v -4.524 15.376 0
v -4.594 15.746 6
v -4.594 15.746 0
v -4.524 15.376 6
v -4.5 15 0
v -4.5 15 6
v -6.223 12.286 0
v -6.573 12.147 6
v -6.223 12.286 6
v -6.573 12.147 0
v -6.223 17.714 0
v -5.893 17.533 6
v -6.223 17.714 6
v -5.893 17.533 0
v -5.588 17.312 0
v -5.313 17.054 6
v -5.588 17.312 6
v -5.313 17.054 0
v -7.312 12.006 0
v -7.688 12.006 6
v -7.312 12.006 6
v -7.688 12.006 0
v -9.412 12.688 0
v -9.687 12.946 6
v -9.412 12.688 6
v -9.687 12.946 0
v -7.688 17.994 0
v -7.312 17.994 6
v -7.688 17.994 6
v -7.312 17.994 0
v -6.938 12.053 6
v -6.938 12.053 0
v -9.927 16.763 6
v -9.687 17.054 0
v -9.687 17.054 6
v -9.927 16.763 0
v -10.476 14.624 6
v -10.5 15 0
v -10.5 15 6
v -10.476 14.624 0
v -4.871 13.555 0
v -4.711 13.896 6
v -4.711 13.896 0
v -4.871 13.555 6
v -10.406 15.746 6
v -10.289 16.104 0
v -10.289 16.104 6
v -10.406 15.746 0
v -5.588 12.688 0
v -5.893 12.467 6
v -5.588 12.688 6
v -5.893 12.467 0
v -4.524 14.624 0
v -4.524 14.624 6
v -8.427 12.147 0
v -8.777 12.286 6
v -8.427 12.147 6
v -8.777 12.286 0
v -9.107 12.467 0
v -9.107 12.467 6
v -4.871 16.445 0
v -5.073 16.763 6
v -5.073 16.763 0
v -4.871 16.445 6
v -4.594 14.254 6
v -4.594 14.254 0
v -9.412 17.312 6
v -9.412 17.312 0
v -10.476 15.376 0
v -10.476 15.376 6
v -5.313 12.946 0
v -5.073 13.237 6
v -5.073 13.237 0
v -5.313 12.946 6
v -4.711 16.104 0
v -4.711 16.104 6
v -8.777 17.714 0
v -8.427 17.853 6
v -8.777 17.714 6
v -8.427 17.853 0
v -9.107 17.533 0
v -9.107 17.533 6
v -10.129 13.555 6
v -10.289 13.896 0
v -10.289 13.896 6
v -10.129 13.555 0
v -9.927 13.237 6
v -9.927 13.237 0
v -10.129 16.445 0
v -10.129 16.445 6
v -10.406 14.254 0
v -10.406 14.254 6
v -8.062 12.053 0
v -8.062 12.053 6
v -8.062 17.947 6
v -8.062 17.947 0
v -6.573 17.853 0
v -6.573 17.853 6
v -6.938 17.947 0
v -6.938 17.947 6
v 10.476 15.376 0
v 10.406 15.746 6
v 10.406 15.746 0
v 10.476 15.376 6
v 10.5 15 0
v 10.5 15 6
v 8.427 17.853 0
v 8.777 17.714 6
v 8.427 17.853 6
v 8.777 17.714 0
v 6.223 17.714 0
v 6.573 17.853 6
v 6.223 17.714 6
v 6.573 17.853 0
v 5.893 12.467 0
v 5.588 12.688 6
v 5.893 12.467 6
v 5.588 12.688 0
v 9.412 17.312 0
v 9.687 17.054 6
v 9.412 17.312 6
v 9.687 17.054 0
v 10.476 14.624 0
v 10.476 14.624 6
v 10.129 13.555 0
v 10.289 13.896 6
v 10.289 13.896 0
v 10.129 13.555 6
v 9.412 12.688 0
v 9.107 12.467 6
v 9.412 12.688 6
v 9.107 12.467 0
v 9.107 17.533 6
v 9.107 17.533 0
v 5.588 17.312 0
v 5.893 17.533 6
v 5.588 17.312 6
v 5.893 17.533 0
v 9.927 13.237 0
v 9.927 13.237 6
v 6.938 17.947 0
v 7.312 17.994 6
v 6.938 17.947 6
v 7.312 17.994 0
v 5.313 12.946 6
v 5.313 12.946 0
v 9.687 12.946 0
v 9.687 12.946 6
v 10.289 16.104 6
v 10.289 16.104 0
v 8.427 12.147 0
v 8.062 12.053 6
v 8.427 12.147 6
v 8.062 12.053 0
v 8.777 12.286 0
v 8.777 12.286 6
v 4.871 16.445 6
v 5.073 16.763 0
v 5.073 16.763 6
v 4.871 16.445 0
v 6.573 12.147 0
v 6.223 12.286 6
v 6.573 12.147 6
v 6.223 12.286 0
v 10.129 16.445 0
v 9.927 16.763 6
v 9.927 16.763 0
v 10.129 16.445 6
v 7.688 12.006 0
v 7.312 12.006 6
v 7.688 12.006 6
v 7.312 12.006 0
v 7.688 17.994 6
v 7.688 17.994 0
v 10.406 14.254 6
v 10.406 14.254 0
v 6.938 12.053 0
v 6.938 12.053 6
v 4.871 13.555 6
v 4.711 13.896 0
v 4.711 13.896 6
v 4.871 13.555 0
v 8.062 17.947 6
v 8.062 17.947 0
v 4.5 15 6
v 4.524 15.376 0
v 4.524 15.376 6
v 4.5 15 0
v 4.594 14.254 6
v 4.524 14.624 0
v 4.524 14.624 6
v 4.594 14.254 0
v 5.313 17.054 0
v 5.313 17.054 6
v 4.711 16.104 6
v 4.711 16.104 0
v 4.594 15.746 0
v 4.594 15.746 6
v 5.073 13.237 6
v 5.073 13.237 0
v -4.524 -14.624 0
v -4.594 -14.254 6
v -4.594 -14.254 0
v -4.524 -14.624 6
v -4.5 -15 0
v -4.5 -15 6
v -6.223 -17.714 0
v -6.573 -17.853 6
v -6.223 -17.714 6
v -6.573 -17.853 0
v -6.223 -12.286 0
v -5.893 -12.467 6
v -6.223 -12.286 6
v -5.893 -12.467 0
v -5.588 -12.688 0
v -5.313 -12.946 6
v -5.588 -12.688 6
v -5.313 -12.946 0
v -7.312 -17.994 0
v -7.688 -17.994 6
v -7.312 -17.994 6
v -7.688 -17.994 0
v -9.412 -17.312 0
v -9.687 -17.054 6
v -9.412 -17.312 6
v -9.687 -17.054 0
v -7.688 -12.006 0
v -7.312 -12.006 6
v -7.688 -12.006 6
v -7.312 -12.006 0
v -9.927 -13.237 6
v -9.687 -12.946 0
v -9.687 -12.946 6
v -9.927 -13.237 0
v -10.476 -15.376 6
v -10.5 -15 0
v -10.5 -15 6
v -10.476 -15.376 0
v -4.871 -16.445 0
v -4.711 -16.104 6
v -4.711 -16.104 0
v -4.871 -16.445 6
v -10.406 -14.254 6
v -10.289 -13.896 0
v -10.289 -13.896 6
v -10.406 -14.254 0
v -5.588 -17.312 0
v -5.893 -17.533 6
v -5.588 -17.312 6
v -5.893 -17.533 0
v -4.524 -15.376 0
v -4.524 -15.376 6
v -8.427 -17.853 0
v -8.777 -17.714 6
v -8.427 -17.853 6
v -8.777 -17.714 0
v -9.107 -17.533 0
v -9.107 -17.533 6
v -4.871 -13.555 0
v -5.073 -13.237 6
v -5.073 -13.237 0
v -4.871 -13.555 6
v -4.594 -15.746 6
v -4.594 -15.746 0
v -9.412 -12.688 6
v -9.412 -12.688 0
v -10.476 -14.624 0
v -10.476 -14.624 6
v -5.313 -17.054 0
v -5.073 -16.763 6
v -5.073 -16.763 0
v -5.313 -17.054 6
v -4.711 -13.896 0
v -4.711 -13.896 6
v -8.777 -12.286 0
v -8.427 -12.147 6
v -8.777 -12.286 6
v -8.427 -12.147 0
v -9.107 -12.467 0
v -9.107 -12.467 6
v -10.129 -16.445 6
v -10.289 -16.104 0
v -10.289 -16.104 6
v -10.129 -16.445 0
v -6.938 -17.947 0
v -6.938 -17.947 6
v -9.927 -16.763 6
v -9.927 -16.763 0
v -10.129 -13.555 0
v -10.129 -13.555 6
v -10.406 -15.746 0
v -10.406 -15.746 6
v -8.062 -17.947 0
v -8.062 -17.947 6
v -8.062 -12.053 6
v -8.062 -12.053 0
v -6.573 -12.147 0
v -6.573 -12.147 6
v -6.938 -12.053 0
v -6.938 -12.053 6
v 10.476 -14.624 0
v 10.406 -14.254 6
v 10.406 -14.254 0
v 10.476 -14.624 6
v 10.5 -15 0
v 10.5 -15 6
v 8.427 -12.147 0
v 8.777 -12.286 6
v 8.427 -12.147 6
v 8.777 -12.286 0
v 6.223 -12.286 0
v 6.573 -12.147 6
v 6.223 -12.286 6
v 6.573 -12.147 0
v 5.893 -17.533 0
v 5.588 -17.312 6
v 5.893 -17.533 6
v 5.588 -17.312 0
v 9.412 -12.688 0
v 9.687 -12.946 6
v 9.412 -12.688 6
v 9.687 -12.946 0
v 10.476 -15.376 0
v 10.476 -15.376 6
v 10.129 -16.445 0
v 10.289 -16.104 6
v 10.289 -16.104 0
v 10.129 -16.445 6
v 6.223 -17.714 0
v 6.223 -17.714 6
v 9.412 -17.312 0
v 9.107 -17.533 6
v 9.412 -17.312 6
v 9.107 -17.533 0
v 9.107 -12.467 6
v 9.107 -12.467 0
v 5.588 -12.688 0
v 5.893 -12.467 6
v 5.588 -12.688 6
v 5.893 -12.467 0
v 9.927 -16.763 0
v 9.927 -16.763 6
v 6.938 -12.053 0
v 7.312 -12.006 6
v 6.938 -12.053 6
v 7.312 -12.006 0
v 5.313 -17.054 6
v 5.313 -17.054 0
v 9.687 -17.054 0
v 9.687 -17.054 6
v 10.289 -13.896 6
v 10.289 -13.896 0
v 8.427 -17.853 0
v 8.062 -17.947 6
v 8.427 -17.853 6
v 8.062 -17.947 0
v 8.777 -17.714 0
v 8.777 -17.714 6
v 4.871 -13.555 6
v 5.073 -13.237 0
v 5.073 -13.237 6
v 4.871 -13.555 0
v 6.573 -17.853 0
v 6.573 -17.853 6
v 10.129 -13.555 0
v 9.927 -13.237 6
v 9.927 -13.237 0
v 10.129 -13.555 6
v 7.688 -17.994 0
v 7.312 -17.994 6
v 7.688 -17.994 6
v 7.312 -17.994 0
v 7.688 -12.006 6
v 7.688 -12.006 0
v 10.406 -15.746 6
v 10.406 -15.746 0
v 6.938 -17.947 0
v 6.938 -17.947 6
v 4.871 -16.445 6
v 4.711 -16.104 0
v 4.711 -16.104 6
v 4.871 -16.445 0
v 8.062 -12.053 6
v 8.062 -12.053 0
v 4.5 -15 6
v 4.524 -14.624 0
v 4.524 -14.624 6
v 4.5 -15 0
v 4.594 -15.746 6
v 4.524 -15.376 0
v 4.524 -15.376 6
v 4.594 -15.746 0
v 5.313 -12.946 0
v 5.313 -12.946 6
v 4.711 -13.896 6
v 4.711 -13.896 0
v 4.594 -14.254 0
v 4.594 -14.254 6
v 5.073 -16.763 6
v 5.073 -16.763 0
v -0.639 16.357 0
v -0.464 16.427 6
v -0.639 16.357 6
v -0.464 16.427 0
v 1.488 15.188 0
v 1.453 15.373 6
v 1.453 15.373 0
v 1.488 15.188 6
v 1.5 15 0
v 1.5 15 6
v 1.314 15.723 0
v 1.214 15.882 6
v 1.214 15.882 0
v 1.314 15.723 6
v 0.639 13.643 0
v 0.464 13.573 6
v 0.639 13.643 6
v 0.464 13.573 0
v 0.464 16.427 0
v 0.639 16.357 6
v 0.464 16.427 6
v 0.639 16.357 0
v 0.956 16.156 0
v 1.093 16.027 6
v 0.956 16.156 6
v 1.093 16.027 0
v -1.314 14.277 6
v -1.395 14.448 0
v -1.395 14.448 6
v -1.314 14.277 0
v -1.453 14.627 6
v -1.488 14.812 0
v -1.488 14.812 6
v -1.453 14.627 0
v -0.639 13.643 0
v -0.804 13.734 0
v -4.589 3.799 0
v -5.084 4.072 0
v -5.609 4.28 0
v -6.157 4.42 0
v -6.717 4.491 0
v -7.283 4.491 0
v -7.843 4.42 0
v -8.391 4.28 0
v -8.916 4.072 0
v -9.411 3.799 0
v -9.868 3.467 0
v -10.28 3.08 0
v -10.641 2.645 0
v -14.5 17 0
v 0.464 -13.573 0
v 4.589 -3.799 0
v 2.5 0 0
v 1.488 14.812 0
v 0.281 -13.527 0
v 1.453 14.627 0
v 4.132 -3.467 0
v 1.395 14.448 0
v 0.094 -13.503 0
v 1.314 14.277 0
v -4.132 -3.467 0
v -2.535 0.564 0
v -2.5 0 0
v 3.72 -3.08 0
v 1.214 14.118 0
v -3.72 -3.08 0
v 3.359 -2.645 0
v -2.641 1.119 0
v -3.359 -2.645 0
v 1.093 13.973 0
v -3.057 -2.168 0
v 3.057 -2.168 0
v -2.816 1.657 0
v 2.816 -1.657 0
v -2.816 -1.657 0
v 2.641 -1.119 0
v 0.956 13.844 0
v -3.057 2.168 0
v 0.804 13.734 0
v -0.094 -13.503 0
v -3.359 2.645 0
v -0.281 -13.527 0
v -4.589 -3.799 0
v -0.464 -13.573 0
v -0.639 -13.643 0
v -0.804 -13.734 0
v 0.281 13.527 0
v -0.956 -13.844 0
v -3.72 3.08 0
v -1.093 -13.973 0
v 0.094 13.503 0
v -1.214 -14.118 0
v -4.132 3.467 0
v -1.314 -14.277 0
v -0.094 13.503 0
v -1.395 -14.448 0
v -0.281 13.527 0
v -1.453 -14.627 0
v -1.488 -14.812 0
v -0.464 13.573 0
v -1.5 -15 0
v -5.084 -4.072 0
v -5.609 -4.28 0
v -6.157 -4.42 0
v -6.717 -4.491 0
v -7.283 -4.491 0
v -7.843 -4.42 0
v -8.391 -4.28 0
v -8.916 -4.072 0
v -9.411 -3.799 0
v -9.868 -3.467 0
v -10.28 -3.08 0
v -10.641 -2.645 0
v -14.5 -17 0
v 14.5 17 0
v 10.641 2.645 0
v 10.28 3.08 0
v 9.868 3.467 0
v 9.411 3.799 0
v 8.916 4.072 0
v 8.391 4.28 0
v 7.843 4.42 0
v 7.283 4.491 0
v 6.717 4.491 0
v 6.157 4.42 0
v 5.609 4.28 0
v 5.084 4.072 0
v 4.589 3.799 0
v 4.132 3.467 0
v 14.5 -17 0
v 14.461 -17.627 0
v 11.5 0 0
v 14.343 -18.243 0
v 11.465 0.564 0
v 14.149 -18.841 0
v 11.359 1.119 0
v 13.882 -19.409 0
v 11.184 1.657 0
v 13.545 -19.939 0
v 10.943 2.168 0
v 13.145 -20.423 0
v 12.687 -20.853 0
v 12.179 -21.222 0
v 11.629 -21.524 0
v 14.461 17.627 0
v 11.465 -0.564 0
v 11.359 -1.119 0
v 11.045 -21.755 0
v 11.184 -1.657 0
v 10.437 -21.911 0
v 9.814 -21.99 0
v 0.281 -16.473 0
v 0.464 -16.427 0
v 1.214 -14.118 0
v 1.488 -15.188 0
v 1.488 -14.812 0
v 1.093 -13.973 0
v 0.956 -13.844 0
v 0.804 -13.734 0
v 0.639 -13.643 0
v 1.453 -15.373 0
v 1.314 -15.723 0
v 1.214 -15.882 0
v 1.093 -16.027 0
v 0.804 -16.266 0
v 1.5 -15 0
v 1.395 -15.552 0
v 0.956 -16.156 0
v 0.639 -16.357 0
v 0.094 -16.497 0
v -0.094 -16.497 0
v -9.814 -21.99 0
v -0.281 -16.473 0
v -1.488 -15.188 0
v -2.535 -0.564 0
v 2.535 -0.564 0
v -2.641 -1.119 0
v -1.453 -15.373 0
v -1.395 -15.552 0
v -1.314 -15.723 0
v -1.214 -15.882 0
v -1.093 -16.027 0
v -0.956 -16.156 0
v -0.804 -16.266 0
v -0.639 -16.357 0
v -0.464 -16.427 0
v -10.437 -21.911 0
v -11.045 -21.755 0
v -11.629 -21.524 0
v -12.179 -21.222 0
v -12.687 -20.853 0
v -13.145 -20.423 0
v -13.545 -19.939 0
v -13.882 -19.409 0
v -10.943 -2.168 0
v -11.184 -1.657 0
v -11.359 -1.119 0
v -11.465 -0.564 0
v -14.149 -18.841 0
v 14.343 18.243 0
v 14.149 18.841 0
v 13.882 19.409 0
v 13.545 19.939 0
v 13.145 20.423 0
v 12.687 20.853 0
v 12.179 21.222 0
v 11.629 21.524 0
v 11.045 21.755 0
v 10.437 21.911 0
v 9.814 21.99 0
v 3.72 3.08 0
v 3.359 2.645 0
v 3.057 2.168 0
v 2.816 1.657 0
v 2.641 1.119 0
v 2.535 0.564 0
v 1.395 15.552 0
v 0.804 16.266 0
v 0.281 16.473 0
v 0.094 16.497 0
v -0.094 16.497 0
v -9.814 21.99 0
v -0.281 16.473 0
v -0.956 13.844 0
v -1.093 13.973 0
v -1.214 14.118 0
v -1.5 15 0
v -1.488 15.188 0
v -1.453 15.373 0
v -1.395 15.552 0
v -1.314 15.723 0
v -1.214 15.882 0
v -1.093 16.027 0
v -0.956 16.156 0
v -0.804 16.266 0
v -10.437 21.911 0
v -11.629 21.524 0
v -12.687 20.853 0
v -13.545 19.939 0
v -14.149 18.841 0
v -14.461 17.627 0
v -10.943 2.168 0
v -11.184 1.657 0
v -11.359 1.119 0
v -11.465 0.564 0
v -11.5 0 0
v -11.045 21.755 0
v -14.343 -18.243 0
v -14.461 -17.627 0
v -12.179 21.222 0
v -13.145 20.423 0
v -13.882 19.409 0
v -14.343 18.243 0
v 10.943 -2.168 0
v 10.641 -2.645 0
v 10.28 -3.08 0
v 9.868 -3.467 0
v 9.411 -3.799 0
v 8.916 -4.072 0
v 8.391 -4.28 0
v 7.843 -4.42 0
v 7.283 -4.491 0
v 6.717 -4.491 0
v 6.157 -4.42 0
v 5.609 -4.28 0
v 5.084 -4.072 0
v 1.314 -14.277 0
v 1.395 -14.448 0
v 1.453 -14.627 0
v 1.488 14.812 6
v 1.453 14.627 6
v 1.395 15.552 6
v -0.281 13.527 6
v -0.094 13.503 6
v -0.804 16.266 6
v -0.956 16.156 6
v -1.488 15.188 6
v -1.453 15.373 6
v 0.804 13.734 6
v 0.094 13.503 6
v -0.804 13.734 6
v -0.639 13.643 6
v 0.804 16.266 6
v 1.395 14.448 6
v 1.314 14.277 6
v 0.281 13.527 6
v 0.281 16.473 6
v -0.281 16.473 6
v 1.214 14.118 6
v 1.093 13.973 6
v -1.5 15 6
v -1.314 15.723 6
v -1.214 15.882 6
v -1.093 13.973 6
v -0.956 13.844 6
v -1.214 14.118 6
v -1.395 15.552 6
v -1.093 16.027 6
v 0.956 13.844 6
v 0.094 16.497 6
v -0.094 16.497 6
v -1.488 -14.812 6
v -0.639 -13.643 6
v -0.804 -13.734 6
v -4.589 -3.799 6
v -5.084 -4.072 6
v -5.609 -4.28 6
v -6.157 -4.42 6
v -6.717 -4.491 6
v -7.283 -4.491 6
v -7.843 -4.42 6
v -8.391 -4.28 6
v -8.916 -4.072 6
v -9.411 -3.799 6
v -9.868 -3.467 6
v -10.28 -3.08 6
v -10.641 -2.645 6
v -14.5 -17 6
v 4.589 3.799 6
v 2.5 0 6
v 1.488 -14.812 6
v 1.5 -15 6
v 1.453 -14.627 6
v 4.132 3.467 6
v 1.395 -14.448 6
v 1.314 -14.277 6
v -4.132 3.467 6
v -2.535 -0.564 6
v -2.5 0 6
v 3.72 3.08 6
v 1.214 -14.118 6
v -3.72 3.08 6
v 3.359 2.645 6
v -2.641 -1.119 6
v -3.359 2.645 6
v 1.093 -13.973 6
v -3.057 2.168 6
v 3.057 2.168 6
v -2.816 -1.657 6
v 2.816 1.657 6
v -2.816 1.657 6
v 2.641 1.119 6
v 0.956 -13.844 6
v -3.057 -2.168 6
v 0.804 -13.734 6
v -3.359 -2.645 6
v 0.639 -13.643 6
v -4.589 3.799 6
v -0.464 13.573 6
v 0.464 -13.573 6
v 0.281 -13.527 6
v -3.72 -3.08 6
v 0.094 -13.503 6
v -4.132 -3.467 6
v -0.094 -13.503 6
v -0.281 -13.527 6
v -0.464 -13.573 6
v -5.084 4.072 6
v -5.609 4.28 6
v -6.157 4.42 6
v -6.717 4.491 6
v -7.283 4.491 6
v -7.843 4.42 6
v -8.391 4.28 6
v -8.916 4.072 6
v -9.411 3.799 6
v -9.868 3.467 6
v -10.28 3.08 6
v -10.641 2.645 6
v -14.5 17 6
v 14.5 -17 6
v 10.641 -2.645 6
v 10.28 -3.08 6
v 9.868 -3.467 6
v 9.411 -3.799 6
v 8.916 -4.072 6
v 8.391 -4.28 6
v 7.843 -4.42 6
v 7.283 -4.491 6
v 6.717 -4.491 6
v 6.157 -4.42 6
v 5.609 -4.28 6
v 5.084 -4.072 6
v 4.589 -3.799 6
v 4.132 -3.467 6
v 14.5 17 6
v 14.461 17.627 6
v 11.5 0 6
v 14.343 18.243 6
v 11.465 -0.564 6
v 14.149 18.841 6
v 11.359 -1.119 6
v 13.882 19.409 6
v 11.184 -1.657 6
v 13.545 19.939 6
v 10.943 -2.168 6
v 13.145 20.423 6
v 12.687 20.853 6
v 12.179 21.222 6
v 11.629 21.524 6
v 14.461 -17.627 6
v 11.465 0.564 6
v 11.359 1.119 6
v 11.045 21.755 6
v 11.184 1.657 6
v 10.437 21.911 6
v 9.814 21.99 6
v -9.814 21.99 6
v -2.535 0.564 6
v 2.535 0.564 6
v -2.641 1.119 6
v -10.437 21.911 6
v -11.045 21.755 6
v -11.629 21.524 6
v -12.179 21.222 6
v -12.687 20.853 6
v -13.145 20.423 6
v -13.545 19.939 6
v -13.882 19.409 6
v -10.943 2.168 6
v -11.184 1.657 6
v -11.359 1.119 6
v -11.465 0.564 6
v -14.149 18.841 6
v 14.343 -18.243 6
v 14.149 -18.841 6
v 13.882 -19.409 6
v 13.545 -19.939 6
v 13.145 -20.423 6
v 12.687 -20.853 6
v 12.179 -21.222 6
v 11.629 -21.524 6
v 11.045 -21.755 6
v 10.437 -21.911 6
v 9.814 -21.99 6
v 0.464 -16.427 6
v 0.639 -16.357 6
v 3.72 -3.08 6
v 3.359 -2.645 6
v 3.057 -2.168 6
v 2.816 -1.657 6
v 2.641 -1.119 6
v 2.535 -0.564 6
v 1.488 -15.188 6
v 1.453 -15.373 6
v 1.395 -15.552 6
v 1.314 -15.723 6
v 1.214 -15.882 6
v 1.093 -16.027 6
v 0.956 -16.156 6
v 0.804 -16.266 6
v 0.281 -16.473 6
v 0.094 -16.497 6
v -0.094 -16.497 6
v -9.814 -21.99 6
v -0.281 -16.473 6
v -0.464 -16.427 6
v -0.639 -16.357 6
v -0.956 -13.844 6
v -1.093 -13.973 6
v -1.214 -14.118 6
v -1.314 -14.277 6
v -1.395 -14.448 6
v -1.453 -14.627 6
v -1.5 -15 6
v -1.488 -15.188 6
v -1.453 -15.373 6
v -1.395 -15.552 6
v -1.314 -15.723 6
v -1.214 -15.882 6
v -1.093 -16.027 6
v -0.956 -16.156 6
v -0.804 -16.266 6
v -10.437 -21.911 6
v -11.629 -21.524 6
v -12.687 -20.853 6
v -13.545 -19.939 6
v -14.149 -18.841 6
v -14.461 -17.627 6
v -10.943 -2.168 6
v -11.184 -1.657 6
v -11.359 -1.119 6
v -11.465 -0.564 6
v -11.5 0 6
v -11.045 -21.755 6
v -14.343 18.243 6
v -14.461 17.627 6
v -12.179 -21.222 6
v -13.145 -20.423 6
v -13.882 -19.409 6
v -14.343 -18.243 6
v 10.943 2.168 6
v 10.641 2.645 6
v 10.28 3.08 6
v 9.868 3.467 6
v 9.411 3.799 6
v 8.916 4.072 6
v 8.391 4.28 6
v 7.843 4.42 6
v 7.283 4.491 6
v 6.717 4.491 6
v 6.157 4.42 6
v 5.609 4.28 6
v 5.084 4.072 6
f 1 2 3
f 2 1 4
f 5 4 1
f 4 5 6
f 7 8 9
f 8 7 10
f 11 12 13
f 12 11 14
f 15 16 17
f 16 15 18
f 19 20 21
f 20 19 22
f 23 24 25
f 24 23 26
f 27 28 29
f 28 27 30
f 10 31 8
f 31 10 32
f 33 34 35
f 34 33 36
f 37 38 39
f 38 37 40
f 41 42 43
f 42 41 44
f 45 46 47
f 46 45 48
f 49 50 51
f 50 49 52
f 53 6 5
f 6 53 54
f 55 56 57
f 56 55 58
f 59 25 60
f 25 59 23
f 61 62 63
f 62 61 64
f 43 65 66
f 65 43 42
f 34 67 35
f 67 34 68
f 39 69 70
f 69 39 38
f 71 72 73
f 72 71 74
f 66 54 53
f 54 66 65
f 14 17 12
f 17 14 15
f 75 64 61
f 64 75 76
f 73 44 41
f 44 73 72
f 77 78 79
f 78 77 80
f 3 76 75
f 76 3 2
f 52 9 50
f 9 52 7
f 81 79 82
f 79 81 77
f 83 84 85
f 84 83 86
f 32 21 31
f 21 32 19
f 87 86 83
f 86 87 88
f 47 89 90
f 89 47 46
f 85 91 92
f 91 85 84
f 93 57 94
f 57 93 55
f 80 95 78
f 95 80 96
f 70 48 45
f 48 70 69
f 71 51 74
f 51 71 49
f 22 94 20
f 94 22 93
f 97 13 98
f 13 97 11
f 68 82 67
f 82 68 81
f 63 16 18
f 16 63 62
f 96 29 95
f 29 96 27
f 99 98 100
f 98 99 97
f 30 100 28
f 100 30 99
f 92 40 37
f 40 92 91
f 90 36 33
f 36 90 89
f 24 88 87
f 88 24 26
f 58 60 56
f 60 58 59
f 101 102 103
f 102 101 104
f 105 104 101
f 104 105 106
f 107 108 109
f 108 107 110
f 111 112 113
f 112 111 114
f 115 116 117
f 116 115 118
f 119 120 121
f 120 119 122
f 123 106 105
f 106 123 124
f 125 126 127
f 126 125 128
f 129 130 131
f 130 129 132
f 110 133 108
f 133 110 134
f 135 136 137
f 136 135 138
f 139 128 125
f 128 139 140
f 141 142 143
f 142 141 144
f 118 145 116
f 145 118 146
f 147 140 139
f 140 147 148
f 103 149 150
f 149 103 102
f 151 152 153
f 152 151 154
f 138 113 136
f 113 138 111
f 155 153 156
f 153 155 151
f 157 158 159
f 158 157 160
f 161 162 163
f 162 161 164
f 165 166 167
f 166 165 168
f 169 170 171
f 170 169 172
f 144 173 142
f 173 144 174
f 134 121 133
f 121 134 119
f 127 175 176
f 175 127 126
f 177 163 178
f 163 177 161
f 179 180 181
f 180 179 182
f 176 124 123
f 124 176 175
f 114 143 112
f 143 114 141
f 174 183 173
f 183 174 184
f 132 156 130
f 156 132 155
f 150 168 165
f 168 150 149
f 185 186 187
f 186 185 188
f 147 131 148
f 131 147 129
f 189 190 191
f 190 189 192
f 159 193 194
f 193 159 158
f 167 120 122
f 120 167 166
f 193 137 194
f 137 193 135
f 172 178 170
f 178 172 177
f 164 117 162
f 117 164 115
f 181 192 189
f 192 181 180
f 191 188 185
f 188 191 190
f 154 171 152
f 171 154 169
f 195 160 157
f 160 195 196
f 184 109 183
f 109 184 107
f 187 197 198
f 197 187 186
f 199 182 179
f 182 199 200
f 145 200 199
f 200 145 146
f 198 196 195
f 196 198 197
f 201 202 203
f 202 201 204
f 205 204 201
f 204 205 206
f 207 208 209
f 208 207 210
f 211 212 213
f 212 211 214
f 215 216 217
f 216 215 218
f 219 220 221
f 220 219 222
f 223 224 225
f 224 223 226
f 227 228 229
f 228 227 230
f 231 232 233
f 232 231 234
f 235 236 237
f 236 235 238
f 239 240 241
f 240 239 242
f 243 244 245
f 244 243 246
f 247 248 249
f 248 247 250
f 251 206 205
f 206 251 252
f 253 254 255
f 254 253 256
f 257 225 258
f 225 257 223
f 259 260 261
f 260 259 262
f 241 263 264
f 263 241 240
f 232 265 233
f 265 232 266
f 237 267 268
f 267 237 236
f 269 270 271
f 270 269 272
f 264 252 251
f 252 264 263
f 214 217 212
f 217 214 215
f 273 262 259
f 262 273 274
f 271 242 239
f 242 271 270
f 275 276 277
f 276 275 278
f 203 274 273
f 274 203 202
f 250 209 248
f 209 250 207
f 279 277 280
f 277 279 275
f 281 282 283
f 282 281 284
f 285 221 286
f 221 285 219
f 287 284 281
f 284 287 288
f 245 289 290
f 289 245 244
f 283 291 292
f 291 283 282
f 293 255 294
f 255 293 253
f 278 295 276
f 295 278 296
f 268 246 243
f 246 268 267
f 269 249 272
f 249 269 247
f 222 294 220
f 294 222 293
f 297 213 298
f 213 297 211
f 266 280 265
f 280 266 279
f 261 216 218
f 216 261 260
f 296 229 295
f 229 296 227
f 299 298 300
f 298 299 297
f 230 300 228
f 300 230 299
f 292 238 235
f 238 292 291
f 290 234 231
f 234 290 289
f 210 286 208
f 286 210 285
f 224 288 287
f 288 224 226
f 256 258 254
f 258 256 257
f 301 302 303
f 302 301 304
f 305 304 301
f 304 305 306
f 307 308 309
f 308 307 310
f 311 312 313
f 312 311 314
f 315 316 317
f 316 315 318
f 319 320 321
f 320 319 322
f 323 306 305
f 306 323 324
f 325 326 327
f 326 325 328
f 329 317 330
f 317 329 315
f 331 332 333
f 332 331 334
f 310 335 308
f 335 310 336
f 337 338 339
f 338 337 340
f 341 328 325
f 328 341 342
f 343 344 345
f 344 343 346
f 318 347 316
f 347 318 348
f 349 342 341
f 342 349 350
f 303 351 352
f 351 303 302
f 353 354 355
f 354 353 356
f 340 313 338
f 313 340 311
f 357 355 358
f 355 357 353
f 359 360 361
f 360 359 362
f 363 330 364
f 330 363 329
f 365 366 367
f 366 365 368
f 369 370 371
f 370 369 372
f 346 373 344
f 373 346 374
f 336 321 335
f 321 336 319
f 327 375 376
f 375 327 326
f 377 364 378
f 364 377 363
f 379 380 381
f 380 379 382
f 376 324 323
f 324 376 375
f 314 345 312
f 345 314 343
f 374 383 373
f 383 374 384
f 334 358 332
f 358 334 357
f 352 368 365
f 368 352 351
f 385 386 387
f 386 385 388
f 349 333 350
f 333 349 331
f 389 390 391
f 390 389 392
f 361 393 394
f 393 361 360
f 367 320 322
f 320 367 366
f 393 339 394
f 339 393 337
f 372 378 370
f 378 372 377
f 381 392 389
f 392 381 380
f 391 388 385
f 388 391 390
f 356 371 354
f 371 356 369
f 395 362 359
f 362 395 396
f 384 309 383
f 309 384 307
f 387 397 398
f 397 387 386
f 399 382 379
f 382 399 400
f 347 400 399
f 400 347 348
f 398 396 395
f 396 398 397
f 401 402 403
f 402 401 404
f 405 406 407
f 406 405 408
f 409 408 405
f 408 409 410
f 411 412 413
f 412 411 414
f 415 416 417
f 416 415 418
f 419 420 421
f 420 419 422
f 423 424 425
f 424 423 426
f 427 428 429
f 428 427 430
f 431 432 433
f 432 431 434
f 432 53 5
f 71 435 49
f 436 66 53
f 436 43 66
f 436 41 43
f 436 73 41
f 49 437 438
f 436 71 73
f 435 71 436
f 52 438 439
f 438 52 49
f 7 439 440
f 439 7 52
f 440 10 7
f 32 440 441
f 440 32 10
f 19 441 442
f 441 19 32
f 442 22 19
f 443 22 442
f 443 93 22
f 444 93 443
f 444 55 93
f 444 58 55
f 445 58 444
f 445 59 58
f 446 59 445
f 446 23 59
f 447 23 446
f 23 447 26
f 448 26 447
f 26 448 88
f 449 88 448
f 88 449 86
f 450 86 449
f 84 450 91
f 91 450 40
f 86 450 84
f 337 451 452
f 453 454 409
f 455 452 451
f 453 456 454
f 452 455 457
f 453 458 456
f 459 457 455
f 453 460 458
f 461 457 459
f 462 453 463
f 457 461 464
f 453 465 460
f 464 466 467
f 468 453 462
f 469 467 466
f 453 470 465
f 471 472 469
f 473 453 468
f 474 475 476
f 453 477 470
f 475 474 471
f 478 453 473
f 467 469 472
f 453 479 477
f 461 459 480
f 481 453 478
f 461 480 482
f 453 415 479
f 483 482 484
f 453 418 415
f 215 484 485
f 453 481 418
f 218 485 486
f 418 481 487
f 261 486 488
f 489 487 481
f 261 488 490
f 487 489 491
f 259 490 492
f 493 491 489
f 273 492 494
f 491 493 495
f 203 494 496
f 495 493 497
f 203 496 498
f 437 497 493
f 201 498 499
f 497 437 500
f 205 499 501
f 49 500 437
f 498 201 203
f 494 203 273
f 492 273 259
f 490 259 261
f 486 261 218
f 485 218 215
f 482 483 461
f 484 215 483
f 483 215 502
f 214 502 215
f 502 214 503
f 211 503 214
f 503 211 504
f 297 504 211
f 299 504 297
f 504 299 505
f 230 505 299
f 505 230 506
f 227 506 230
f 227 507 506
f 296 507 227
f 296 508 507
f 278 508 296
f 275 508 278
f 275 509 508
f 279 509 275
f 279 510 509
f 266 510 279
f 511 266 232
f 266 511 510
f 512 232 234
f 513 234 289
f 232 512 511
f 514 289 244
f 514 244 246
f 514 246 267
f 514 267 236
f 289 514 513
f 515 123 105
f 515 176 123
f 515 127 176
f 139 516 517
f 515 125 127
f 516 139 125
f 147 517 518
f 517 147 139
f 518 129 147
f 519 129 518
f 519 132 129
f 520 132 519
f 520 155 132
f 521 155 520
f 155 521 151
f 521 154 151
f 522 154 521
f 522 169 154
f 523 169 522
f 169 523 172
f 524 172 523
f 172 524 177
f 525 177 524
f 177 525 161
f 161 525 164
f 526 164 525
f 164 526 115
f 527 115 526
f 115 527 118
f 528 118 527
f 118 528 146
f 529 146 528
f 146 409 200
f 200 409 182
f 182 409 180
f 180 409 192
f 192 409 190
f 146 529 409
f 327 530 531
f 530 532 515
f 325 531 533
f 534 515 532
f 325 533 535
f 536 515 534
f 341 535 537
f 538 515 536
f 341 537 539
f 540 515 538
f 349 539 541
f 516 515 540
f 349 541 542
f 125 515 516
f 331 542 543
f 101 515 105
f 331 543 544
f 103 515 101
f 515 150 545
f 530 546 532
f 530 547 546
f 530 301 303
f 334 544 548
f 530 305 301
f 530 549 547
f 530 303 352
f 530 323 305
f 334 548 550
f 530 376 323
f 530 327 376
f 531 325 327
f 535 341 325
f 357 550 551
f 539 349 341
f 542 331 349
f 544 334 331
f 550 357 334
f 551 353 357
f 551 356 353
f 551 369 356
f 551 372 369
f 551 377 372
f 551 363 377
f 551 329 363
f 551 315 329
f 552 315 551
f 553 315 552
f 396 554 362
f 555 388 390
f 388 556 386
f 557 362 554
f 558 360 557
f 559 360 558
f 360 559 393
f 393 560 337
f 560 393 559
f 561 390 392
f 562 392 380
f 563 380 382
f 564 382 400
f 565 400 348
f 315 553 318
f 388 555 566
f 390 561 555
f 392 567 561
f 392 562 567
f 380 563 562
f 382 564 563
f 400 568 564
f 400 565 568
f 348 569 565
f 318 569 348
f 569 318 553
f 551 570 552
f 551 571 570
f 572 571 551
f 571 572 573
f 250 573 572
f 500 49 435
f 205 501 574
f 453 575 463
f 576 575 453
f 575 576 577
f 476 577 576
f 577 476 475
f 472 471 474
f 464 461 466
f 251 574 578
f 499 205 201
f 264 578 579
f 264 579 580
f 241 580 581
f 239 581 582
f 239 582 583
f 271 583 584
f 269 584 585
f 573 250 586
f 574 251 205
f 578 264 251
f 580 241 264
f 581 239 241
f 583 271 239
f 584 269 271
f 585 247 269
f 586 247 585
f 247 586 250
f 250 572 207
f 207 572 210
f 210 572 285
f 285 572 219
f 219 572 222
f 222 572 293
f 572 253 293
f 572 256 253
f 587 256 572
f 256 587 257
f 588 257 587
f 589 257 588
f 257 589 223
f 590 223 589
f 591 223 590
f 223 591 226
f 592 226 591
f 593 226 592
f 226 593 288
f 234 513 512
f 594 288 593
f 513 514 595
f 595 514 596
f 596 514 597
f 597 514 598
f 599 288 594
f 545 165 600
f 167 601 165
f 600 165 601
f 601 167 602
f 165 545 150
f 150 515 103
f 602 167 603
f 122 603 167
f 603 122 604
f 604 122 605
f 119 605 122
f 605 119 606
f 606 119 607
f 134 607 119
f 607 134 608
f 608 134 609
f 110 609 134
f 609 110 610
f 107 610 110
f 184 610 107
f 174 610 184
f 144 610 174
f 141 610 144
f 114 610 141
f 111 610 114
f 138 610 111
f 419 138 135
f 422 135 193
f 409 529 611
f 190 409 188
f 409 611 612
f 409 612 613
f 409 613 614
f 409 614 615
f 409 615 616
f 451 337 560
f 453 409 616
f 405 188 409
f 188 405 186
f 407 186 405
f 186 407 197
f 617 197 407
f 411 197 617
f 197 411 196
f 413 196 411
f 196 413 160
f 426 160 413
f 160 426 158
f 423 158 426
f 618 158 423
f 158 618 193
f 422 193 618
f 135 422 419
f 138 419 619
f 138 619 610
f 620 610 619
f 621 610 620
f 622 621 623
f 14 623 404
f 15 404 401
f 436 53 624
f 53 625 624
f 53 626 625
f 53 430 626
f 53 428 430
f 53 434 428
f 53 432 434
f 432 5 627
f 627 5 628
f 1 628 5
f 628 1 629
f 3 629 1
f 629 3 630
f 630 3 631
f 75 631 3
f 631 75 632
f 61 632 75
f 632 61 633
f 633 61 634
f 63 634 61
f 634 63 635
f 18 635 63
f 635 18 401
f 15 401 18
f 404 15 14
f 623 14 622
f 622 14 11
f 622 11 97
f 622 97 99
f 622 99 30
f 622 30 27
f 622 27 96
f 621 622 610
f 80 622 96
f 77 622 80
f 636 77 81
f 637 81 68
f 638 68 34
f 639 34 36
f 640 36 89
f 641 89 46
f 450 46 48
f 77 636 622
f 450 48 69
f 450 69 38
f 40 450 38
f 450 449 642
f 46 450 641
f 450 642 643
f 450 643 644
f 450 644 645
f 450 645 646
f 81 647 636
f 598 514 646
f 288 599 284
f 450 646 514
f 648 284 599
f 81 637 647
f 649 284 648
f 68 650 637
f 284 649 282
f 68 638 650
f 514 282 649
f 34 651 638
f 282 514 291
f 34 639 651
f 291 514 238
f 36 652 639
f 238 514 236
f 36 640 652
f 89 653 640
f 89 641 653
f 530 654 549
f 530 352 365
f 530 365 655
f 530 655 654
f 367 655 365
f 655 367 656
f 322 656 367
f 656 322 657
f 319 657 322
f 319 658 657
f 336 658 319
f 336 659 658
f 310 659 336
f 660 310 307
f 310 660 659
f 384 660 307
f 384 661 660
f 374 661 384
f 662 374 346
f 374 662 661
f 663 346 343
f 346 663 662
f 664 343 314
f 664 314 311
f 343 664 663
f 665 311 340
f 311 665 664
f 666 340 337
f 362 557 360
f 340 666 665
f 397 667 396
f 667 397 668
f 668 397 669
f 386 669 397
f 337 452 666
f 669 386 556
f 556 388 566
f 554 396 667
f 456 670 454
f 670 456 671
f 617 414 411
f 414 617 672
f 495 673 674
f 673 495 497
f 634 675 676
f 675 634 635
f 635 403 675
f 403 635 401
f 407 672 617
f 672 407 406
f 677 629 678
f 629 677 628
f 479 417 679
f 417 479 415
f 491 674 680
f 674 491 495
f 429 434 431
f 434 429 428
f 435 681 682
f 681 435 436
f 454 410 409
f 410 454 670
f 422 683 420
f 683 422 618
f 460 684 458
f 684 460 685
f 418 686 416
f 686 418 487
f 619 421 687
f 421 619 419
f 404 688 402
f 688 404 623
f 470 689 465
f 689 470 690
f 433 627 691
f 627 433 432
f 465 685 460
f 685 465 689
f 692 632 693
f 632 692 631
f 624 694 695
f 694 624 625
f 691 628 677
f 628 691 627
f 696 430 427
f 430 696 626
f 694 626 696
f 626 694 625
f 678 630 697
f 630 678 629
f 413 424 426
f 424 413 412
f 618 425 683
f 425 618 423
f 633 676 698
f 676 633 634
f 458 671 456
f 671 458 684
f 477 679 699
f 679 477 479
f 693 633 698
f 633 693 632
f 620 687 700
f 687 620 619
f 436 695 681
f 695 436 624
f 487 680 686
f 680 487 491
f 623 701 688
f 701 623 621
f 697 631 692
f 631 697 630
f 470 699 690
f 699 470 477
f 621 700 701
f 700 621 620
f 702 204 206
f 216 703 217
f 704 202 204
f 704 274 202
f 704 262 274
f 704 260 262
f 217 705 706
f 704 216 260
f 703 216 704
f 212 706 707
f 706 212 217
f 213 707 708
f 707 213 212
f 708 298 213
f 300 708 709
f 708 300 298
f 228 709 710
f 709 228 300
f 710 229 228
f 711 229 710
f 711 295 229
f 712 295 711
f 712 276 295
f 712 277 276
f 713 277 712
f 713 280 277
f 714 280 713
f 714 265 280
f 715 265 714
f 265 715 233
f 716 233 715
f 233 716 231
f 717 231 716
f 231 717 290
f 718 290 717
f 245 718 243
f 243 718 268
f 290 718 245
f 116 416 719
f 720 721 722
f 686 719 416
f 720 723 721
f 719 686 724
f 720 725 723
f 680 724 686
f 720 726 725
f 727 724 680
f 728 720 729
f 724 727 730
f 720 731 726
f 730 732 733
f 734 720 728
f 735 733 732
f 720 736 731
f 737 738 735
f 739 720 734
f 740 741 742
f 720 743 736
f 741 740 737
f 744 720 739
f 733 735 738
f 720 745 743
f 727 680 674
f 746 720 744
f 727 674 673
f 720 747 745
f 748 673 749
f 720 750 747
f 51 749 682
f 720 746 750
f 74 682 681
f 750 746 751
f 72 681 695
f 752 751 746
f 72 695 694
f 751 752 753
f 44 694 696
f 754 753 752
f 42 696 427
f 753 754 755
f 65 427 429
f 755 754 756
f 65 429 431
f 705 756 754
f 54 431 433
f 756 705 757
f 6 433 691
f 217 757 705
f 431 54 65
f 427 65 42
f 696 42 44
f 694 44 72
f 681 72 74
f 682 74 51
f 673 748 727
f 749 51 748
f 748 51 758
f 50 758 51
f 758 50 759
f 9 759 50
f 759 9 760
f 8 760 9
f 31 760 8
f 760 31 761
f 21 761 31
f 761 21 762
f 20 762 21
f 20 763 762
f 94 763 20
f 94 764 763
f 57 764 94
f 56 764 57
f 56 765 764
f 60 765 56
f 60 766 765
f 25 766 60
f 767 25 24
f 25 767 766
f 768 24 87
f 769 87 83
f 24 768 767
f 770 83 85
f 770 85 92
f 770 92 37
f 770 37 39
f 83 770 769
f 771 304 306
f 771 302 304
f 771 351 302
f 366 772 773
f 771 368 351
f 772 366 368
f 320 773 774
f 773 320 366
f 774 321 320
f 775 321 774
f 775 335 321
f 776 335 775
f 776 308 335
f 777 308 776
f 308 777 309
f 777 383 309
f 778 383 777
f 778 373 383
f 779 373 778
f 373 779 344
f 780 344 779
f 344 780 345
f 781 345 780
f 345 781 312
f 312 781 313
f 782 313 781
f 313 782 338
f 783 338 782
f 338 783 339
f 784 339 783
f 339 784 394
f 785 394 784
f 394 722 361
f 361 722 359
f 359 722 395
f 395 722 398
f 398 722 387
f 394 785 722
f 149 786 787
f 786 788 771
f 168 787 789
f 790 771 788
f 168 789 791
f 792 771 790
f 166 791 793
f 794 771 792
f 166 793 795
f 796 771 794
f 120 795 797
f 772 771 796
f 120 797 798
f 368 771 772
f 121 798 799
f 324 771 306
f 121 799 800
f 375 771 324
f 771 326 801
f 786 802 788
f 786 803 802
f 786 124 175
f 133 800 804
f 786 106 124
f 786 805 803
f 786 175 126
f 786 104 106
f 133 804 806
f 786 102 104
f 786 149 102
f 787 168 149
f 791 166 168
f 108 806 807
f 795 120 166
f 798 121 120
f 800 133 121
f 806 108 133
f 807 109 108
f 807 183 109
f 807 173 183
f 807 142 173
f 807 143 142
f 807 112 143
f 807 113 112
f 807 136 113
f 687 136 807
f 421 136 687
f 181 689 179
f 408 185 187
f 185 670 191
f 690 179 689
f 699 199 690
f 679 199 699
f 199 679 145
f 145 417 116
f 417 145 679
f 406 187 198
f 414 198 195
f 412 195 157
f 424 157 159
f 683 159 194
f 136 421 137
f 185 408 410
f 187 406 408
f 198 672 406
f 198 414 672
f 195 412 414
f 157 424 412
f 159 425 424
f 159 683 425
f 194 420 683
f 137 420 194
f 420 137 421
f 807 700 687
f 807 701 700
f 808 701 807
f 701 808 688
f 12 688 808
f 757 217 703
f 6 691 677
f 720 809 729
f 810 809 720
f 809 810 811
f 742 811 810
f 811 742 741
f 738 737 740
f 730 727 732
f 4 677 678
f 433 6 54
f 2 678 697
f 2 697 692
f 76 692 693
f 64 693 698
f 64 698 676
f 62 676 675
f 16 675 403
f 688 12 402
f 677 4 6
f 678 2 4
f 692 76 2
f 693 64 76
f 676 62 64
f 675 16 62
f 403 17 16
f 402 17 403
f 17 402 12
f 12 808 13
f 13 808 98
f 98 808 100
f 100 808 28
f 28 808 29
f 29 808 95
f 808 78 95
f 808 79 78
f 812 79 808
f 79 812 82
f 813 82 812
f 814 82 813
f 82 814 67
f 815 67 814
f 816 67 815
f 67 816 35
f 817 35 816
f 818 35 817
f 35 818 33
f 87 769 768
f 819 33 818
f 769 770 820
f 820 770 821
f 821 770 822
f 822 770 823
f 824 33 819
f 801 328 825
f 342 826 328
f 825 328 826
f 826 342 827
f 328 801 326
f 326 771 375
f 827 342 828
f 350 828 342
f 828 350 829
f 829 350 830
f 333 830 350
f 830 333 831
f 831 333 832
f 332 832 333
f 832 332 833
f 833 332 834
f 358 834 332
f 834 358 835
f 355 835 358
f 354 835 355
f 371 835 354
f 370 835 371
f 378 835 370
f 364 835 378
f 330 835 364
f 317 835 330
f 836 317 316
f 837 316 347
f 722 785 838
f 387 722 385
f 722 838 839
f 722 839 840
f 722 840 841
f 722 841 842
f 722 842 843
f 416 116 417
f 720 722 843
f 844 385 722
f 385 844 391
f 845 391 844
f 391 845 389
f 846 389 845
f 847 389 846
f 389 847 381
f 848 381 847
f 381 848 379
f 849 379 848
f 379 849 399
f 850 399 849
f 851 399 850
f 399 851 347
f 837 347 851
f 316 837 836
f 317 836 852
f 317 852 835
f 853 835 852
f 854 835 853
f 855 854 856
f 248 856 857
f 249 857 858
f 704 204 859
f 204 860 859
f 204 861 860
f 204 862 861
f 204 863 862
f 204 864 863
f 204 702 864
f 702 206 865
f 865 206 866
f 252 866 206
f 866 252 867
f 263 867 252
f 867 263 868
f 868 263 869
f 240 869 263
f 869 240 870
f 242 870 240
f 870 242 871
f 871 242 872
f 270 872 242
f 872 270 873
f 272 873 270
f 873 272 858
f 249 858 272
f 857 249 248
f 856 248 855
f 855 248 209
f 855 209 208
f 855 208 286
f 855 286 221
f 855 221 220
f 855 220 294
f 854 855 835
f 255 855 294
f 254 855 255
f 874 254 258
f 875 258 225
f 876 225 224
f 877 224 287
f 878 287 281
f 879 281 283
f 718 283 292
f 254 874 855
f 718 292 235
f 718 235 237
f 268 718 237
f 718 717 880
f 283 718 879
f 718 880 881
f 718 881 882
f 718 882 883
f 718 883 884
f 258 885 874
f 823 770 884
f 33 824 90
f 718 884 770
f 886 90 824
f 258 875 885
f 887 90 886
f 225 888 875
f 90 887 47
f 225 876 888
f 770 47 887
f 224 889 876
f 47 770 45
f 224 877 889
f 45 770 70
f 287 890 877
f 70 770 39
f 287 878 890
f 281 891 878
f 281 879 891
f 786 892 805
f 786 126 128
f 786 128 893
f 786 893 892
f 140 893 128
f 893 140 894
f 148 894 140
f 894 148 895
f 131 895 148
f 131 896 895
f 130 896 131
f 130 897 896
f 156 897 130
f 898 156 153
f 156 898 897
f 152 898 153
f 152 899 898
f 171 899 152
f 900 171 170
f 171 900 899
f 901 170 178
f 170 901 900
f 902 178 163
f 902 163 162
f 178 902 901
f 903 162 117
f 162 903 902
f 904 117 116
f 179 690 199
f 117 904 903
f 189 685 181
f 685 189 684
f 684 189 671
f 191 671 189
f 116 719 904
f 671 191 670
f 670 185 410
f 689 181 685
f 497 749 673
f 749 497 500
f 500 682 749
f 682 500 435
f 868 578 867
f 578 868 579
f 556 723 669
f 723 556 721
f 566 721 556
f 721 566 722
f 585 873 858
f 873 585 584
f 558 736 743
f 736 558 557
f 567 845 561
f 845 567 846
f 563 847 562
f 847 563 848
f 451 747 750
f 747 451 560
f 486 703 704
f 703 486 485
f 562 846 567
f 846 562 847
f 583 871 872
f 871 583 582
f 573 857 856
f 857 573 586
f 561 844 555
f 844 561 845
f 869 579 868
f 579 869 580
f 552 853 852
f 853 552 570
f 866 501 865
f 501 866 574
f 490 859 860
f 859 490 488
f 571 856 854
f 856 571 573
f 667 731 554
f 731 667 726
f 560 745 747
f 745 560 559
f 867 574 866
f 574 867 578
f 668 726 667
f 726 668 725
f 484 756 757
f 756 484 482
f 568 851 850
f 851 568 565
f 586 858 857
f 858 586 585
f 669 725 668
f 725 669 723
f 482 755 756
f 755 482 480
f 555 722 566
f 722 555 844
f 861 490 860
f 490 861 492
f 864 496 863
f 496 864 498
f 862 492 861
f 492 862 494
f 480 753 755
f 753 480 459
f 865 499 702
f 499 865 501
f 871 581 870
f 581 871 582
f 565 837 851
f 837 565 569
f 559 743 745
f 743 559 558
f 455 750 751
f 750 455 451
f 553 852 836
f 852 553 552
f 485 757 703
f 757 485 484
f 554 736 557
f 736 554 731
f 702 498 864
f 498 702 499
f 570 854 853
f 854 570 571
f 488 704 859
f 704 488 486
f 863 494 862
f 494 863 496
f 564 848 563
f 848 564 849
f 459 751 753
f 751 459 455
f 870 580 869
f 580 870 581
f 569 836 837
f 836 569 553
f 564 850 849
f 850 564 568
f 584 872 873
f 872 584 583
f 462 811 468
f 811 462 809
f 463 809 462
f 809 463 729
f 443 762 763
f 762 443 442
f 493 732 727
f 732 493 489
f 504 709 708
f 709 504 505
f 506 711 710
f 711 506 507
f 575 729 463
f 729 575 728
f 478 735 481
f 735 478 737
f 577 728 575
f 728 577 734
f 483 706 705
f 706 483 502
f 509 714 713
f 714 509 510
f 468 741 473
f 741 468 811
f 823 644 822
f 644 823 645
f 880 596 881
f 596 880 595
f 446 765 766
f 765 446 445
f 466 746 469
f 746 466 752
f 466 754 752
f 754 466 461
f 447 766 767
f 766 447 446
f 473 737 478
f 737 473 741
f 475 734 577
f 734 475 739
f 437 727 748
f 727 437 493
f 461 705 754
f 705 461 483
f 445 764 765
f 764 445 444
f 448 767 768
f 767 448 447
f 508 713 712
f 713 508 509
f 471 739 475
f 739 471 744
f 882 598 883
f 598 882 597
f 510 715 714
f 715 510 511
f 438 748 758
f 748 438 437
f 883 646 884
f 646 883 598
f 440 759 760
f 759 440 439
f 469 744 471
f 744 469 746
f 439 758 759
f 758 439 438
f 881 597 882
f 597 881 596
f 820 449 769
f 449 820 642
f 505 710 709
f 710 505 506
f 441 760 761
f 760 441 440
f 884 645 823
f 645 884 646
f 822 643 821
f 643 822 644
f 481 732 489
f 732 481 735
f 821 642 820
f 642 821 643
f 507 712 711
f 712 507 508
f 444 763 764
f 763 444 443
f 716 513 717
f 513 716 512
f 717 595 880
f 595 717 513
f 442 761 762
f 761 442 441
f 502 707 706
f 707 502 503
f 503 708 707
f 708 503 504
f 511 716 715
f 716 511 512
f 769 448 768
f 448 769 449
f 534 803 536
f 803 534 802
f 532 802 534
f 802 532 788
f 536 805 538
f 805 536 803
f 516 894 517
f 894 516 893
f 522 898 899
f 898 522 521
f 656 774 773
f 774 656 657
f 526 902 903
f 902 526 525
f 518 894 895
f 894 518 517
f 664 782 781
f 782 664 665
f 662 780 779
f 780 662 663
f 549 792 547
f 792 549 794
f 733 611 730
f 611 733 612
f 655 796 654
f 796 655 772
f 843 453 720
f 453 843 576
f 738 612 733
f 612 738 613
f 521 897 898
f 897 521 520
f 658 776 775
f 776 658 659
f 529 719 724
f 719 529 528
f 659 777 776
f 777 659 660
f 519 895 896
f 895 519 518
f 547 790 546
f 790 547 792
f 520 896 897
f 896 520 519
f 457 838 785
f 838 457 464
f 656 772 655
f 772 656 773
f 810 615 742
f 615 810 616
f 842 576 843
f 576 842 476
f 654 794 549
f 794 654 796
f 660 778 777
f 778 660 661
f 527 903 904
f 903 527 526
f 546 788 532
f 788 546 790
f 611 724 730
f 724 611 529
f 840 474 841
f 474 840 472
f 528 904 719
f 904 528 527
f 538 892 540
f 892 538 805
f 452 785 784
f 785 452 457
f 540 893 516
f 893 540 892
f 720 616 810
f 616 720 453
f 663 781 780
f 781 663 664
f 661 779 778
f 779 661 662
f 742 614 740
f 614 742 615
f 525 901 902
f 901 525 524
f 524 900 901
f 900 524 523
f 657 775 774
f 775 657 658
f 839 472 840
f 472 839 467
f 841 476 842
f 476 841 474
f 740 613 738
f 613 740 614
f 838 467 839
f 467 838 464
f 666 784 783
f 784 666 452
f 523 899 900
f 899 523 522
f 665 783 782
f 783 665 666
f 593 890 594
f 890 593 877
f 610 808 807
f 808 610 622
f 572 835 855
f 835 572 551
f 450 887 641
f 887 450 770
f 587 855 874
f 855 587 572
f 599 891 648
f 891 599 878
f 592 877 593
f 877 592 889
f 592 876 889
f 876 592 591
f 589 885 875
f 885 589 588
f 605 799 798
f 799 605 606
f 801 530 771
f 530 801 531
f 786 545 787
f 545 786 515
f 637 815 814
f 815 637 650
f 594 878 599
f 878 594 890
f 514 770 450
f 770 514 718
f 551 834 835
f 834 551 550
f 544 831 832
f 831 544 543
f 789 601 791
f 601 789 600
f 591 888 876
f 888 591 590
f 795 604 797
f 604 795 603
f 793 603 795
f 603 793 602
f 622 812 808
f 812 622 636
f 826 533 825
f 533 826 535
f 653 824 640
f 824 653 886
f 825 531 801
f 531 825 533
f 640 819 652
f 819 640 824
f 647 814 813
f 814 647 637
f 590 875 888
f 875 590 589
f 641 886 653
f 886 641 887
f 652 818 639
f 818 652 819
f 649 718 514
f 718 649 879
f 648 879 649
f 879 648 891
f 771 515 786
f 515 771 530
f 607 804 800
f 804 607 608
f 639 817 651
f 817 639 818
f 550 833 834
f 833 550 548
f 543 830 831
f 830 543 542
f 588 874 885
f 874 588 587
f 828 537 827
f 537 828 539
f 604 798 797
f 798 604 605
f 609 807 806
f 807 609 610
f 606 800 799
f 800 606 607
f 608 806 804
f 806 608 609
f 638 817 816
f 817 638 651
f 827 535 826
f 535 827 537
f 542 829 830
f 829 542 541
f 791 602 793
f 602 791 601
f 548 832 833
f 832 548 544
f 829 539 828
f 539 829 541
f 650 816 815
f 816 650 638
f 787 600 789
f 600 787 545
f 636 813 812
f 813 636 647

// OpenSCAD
$fn = 50;


difference() {
	union() {
		hull() {
			translate(v = [-9.5000000000, 17.0000000000, 0]) {
				cylinder(h = 6, r = 5);
			}
			translate(v = [9.5000000000, 17.0000000000, 0]) {
				cylinder(h = 6, r = 5);
			}
			translate(v = [-9.5000000000, -17.0000000000, 0]) {
				cylinder(h = 6, r = 5);
			}
			translate(v = [9.5000000000, -17.0000000000, 0]) {
				cylinder(h = 6, r = 5);
			}
		}
	}
	union() {
		#translate(v = [-7.5000000000, 15.0000000000, 0]) {
			cylinder(h = 6, r = 3.0000000000);
		}
		#translate(v = [7.5000000000, 15.0000000000, 0]) {
			cylinder(h = 6, r = 3.0000000000);
		}
		#translate(v = [-7.5000000000, -15.0000000000, 0]) {
			cylinder(h = 6, r = 3.0000000000);
		}
		#translate(v = [7.5000000000, -15.0000000000, 0]) {
			cylinder(h = 6, r = 3.0000000000);
		}
		#translate(v = [-7.5000000000, -15.0000000000, -100.0000000000]) {
			cylinder(h = 200, r = 3.0000000000);
		}
		#translate(v = [-7.5000000000, 15.0000000000, -100.0000000000]) {
			cylinder(h = 200, r = 3.0000000000);
		}
		#translate(v = [7.5000000000, -15.0000000000, -100.0000000000]) {
			cylinder(h = 200, r = 3.0000000000);
		}
		#translate(v = [7.5000000000, 15.0000000000, -100.0000000000]) {
			cylinder(h = 200, r = 3.0000000000);
		}
		#translate(v = [-7.5000000000, 15.0000000000, 0]) {
			cylinder(h = 6, r = 1.5000000000);
		}
		#translate(v = [0.0000000000, 15.0000000000, 0]) {
			cylinder(h = 6, r = 1.5000000000);
		}
		#translate(v = [7.5000000000, 15.0000000000, 0]) {
			cylinder(h = 6, r = 1.5000000000);
		}
		#translate(v = [-7.5000000000, -15.0000000000, 0]) {
			cylinder(h = 6, r = 1.5000000000);
		}
		#translate(v = [0.0000000000, -15.0000000000, 0]) {
			cylinder(h = 6, r = 1.5000000000);
		}
		#translate(v = [7.5000000000, -15.0000000000, 0]) {
			cylinder(h = 6, r = 1.5000000000);
		}
		#translate(v = [-7.5000000000, 15.0000000000, 0]) {
			cylinder(h = 6, r = 1.5000000000);
		}
		#translate(v = [0.0000000000, 15.0000000000, 0]) {
			cylinder(h = 6, r = 1.5000000000);
		}
		#translate(v = [7.5000000000, 15.0000000000, 0]) {
			cylinder(h = 6, r = 1.5000000000);
		}
		#translate(v = [-7.5000000000, -15.0000000000, 0]) {
			cylinder(h = 6, r = 1.5000000000);
		}
		#translate(v = [0.0000000000, -15.0000000000, 0]) {
			cylinder(h = 6, r = 1.5000000000);
		}
		#translate(v = [7.5000000000, -15.0000000000, 0]) {
			cylinder(h = 6, r = 1.5000000000);
		}
		#translate(v = [-7.5000000000, 15.0000000000, 0]) {
			cylinder(h = 6, r = 1.5000000000);
		}
		#translate(v = [0.0000000000, 15.0000000000, 0]) {
			cylinder(h = 6, r = 1.5000000000);
		}
		#translate(v = [7.5000000000, 15.0000000000, 0]) {
			cylinder(h = 6, r = 1.5000000000);
		}
		#translate(v = [-7.5000000000, -15.0000000000, 0]) {
			cylinder(h = 6, r = 1.5000000000);
		}
		#translate(v = [0.0000000000, -15.0000000000, 0]) {
			cylinder(h = 6, r = 1.5000000000);
		}
		#translate(v = [7.5000000000, -15.0000000000, 0]) {
			cylinder(h = 6, r = 1.5000000000);
		}
		#translate(v = [-7.0000000000, 0, 0]) {
			cylinder(h = 6, r = 4.5000000000);
		}
		#translate(v = [7.0000000000, 0, 0]) {
			cylinder(h = 6, r = 4.5000000000);
		}
	}
}
